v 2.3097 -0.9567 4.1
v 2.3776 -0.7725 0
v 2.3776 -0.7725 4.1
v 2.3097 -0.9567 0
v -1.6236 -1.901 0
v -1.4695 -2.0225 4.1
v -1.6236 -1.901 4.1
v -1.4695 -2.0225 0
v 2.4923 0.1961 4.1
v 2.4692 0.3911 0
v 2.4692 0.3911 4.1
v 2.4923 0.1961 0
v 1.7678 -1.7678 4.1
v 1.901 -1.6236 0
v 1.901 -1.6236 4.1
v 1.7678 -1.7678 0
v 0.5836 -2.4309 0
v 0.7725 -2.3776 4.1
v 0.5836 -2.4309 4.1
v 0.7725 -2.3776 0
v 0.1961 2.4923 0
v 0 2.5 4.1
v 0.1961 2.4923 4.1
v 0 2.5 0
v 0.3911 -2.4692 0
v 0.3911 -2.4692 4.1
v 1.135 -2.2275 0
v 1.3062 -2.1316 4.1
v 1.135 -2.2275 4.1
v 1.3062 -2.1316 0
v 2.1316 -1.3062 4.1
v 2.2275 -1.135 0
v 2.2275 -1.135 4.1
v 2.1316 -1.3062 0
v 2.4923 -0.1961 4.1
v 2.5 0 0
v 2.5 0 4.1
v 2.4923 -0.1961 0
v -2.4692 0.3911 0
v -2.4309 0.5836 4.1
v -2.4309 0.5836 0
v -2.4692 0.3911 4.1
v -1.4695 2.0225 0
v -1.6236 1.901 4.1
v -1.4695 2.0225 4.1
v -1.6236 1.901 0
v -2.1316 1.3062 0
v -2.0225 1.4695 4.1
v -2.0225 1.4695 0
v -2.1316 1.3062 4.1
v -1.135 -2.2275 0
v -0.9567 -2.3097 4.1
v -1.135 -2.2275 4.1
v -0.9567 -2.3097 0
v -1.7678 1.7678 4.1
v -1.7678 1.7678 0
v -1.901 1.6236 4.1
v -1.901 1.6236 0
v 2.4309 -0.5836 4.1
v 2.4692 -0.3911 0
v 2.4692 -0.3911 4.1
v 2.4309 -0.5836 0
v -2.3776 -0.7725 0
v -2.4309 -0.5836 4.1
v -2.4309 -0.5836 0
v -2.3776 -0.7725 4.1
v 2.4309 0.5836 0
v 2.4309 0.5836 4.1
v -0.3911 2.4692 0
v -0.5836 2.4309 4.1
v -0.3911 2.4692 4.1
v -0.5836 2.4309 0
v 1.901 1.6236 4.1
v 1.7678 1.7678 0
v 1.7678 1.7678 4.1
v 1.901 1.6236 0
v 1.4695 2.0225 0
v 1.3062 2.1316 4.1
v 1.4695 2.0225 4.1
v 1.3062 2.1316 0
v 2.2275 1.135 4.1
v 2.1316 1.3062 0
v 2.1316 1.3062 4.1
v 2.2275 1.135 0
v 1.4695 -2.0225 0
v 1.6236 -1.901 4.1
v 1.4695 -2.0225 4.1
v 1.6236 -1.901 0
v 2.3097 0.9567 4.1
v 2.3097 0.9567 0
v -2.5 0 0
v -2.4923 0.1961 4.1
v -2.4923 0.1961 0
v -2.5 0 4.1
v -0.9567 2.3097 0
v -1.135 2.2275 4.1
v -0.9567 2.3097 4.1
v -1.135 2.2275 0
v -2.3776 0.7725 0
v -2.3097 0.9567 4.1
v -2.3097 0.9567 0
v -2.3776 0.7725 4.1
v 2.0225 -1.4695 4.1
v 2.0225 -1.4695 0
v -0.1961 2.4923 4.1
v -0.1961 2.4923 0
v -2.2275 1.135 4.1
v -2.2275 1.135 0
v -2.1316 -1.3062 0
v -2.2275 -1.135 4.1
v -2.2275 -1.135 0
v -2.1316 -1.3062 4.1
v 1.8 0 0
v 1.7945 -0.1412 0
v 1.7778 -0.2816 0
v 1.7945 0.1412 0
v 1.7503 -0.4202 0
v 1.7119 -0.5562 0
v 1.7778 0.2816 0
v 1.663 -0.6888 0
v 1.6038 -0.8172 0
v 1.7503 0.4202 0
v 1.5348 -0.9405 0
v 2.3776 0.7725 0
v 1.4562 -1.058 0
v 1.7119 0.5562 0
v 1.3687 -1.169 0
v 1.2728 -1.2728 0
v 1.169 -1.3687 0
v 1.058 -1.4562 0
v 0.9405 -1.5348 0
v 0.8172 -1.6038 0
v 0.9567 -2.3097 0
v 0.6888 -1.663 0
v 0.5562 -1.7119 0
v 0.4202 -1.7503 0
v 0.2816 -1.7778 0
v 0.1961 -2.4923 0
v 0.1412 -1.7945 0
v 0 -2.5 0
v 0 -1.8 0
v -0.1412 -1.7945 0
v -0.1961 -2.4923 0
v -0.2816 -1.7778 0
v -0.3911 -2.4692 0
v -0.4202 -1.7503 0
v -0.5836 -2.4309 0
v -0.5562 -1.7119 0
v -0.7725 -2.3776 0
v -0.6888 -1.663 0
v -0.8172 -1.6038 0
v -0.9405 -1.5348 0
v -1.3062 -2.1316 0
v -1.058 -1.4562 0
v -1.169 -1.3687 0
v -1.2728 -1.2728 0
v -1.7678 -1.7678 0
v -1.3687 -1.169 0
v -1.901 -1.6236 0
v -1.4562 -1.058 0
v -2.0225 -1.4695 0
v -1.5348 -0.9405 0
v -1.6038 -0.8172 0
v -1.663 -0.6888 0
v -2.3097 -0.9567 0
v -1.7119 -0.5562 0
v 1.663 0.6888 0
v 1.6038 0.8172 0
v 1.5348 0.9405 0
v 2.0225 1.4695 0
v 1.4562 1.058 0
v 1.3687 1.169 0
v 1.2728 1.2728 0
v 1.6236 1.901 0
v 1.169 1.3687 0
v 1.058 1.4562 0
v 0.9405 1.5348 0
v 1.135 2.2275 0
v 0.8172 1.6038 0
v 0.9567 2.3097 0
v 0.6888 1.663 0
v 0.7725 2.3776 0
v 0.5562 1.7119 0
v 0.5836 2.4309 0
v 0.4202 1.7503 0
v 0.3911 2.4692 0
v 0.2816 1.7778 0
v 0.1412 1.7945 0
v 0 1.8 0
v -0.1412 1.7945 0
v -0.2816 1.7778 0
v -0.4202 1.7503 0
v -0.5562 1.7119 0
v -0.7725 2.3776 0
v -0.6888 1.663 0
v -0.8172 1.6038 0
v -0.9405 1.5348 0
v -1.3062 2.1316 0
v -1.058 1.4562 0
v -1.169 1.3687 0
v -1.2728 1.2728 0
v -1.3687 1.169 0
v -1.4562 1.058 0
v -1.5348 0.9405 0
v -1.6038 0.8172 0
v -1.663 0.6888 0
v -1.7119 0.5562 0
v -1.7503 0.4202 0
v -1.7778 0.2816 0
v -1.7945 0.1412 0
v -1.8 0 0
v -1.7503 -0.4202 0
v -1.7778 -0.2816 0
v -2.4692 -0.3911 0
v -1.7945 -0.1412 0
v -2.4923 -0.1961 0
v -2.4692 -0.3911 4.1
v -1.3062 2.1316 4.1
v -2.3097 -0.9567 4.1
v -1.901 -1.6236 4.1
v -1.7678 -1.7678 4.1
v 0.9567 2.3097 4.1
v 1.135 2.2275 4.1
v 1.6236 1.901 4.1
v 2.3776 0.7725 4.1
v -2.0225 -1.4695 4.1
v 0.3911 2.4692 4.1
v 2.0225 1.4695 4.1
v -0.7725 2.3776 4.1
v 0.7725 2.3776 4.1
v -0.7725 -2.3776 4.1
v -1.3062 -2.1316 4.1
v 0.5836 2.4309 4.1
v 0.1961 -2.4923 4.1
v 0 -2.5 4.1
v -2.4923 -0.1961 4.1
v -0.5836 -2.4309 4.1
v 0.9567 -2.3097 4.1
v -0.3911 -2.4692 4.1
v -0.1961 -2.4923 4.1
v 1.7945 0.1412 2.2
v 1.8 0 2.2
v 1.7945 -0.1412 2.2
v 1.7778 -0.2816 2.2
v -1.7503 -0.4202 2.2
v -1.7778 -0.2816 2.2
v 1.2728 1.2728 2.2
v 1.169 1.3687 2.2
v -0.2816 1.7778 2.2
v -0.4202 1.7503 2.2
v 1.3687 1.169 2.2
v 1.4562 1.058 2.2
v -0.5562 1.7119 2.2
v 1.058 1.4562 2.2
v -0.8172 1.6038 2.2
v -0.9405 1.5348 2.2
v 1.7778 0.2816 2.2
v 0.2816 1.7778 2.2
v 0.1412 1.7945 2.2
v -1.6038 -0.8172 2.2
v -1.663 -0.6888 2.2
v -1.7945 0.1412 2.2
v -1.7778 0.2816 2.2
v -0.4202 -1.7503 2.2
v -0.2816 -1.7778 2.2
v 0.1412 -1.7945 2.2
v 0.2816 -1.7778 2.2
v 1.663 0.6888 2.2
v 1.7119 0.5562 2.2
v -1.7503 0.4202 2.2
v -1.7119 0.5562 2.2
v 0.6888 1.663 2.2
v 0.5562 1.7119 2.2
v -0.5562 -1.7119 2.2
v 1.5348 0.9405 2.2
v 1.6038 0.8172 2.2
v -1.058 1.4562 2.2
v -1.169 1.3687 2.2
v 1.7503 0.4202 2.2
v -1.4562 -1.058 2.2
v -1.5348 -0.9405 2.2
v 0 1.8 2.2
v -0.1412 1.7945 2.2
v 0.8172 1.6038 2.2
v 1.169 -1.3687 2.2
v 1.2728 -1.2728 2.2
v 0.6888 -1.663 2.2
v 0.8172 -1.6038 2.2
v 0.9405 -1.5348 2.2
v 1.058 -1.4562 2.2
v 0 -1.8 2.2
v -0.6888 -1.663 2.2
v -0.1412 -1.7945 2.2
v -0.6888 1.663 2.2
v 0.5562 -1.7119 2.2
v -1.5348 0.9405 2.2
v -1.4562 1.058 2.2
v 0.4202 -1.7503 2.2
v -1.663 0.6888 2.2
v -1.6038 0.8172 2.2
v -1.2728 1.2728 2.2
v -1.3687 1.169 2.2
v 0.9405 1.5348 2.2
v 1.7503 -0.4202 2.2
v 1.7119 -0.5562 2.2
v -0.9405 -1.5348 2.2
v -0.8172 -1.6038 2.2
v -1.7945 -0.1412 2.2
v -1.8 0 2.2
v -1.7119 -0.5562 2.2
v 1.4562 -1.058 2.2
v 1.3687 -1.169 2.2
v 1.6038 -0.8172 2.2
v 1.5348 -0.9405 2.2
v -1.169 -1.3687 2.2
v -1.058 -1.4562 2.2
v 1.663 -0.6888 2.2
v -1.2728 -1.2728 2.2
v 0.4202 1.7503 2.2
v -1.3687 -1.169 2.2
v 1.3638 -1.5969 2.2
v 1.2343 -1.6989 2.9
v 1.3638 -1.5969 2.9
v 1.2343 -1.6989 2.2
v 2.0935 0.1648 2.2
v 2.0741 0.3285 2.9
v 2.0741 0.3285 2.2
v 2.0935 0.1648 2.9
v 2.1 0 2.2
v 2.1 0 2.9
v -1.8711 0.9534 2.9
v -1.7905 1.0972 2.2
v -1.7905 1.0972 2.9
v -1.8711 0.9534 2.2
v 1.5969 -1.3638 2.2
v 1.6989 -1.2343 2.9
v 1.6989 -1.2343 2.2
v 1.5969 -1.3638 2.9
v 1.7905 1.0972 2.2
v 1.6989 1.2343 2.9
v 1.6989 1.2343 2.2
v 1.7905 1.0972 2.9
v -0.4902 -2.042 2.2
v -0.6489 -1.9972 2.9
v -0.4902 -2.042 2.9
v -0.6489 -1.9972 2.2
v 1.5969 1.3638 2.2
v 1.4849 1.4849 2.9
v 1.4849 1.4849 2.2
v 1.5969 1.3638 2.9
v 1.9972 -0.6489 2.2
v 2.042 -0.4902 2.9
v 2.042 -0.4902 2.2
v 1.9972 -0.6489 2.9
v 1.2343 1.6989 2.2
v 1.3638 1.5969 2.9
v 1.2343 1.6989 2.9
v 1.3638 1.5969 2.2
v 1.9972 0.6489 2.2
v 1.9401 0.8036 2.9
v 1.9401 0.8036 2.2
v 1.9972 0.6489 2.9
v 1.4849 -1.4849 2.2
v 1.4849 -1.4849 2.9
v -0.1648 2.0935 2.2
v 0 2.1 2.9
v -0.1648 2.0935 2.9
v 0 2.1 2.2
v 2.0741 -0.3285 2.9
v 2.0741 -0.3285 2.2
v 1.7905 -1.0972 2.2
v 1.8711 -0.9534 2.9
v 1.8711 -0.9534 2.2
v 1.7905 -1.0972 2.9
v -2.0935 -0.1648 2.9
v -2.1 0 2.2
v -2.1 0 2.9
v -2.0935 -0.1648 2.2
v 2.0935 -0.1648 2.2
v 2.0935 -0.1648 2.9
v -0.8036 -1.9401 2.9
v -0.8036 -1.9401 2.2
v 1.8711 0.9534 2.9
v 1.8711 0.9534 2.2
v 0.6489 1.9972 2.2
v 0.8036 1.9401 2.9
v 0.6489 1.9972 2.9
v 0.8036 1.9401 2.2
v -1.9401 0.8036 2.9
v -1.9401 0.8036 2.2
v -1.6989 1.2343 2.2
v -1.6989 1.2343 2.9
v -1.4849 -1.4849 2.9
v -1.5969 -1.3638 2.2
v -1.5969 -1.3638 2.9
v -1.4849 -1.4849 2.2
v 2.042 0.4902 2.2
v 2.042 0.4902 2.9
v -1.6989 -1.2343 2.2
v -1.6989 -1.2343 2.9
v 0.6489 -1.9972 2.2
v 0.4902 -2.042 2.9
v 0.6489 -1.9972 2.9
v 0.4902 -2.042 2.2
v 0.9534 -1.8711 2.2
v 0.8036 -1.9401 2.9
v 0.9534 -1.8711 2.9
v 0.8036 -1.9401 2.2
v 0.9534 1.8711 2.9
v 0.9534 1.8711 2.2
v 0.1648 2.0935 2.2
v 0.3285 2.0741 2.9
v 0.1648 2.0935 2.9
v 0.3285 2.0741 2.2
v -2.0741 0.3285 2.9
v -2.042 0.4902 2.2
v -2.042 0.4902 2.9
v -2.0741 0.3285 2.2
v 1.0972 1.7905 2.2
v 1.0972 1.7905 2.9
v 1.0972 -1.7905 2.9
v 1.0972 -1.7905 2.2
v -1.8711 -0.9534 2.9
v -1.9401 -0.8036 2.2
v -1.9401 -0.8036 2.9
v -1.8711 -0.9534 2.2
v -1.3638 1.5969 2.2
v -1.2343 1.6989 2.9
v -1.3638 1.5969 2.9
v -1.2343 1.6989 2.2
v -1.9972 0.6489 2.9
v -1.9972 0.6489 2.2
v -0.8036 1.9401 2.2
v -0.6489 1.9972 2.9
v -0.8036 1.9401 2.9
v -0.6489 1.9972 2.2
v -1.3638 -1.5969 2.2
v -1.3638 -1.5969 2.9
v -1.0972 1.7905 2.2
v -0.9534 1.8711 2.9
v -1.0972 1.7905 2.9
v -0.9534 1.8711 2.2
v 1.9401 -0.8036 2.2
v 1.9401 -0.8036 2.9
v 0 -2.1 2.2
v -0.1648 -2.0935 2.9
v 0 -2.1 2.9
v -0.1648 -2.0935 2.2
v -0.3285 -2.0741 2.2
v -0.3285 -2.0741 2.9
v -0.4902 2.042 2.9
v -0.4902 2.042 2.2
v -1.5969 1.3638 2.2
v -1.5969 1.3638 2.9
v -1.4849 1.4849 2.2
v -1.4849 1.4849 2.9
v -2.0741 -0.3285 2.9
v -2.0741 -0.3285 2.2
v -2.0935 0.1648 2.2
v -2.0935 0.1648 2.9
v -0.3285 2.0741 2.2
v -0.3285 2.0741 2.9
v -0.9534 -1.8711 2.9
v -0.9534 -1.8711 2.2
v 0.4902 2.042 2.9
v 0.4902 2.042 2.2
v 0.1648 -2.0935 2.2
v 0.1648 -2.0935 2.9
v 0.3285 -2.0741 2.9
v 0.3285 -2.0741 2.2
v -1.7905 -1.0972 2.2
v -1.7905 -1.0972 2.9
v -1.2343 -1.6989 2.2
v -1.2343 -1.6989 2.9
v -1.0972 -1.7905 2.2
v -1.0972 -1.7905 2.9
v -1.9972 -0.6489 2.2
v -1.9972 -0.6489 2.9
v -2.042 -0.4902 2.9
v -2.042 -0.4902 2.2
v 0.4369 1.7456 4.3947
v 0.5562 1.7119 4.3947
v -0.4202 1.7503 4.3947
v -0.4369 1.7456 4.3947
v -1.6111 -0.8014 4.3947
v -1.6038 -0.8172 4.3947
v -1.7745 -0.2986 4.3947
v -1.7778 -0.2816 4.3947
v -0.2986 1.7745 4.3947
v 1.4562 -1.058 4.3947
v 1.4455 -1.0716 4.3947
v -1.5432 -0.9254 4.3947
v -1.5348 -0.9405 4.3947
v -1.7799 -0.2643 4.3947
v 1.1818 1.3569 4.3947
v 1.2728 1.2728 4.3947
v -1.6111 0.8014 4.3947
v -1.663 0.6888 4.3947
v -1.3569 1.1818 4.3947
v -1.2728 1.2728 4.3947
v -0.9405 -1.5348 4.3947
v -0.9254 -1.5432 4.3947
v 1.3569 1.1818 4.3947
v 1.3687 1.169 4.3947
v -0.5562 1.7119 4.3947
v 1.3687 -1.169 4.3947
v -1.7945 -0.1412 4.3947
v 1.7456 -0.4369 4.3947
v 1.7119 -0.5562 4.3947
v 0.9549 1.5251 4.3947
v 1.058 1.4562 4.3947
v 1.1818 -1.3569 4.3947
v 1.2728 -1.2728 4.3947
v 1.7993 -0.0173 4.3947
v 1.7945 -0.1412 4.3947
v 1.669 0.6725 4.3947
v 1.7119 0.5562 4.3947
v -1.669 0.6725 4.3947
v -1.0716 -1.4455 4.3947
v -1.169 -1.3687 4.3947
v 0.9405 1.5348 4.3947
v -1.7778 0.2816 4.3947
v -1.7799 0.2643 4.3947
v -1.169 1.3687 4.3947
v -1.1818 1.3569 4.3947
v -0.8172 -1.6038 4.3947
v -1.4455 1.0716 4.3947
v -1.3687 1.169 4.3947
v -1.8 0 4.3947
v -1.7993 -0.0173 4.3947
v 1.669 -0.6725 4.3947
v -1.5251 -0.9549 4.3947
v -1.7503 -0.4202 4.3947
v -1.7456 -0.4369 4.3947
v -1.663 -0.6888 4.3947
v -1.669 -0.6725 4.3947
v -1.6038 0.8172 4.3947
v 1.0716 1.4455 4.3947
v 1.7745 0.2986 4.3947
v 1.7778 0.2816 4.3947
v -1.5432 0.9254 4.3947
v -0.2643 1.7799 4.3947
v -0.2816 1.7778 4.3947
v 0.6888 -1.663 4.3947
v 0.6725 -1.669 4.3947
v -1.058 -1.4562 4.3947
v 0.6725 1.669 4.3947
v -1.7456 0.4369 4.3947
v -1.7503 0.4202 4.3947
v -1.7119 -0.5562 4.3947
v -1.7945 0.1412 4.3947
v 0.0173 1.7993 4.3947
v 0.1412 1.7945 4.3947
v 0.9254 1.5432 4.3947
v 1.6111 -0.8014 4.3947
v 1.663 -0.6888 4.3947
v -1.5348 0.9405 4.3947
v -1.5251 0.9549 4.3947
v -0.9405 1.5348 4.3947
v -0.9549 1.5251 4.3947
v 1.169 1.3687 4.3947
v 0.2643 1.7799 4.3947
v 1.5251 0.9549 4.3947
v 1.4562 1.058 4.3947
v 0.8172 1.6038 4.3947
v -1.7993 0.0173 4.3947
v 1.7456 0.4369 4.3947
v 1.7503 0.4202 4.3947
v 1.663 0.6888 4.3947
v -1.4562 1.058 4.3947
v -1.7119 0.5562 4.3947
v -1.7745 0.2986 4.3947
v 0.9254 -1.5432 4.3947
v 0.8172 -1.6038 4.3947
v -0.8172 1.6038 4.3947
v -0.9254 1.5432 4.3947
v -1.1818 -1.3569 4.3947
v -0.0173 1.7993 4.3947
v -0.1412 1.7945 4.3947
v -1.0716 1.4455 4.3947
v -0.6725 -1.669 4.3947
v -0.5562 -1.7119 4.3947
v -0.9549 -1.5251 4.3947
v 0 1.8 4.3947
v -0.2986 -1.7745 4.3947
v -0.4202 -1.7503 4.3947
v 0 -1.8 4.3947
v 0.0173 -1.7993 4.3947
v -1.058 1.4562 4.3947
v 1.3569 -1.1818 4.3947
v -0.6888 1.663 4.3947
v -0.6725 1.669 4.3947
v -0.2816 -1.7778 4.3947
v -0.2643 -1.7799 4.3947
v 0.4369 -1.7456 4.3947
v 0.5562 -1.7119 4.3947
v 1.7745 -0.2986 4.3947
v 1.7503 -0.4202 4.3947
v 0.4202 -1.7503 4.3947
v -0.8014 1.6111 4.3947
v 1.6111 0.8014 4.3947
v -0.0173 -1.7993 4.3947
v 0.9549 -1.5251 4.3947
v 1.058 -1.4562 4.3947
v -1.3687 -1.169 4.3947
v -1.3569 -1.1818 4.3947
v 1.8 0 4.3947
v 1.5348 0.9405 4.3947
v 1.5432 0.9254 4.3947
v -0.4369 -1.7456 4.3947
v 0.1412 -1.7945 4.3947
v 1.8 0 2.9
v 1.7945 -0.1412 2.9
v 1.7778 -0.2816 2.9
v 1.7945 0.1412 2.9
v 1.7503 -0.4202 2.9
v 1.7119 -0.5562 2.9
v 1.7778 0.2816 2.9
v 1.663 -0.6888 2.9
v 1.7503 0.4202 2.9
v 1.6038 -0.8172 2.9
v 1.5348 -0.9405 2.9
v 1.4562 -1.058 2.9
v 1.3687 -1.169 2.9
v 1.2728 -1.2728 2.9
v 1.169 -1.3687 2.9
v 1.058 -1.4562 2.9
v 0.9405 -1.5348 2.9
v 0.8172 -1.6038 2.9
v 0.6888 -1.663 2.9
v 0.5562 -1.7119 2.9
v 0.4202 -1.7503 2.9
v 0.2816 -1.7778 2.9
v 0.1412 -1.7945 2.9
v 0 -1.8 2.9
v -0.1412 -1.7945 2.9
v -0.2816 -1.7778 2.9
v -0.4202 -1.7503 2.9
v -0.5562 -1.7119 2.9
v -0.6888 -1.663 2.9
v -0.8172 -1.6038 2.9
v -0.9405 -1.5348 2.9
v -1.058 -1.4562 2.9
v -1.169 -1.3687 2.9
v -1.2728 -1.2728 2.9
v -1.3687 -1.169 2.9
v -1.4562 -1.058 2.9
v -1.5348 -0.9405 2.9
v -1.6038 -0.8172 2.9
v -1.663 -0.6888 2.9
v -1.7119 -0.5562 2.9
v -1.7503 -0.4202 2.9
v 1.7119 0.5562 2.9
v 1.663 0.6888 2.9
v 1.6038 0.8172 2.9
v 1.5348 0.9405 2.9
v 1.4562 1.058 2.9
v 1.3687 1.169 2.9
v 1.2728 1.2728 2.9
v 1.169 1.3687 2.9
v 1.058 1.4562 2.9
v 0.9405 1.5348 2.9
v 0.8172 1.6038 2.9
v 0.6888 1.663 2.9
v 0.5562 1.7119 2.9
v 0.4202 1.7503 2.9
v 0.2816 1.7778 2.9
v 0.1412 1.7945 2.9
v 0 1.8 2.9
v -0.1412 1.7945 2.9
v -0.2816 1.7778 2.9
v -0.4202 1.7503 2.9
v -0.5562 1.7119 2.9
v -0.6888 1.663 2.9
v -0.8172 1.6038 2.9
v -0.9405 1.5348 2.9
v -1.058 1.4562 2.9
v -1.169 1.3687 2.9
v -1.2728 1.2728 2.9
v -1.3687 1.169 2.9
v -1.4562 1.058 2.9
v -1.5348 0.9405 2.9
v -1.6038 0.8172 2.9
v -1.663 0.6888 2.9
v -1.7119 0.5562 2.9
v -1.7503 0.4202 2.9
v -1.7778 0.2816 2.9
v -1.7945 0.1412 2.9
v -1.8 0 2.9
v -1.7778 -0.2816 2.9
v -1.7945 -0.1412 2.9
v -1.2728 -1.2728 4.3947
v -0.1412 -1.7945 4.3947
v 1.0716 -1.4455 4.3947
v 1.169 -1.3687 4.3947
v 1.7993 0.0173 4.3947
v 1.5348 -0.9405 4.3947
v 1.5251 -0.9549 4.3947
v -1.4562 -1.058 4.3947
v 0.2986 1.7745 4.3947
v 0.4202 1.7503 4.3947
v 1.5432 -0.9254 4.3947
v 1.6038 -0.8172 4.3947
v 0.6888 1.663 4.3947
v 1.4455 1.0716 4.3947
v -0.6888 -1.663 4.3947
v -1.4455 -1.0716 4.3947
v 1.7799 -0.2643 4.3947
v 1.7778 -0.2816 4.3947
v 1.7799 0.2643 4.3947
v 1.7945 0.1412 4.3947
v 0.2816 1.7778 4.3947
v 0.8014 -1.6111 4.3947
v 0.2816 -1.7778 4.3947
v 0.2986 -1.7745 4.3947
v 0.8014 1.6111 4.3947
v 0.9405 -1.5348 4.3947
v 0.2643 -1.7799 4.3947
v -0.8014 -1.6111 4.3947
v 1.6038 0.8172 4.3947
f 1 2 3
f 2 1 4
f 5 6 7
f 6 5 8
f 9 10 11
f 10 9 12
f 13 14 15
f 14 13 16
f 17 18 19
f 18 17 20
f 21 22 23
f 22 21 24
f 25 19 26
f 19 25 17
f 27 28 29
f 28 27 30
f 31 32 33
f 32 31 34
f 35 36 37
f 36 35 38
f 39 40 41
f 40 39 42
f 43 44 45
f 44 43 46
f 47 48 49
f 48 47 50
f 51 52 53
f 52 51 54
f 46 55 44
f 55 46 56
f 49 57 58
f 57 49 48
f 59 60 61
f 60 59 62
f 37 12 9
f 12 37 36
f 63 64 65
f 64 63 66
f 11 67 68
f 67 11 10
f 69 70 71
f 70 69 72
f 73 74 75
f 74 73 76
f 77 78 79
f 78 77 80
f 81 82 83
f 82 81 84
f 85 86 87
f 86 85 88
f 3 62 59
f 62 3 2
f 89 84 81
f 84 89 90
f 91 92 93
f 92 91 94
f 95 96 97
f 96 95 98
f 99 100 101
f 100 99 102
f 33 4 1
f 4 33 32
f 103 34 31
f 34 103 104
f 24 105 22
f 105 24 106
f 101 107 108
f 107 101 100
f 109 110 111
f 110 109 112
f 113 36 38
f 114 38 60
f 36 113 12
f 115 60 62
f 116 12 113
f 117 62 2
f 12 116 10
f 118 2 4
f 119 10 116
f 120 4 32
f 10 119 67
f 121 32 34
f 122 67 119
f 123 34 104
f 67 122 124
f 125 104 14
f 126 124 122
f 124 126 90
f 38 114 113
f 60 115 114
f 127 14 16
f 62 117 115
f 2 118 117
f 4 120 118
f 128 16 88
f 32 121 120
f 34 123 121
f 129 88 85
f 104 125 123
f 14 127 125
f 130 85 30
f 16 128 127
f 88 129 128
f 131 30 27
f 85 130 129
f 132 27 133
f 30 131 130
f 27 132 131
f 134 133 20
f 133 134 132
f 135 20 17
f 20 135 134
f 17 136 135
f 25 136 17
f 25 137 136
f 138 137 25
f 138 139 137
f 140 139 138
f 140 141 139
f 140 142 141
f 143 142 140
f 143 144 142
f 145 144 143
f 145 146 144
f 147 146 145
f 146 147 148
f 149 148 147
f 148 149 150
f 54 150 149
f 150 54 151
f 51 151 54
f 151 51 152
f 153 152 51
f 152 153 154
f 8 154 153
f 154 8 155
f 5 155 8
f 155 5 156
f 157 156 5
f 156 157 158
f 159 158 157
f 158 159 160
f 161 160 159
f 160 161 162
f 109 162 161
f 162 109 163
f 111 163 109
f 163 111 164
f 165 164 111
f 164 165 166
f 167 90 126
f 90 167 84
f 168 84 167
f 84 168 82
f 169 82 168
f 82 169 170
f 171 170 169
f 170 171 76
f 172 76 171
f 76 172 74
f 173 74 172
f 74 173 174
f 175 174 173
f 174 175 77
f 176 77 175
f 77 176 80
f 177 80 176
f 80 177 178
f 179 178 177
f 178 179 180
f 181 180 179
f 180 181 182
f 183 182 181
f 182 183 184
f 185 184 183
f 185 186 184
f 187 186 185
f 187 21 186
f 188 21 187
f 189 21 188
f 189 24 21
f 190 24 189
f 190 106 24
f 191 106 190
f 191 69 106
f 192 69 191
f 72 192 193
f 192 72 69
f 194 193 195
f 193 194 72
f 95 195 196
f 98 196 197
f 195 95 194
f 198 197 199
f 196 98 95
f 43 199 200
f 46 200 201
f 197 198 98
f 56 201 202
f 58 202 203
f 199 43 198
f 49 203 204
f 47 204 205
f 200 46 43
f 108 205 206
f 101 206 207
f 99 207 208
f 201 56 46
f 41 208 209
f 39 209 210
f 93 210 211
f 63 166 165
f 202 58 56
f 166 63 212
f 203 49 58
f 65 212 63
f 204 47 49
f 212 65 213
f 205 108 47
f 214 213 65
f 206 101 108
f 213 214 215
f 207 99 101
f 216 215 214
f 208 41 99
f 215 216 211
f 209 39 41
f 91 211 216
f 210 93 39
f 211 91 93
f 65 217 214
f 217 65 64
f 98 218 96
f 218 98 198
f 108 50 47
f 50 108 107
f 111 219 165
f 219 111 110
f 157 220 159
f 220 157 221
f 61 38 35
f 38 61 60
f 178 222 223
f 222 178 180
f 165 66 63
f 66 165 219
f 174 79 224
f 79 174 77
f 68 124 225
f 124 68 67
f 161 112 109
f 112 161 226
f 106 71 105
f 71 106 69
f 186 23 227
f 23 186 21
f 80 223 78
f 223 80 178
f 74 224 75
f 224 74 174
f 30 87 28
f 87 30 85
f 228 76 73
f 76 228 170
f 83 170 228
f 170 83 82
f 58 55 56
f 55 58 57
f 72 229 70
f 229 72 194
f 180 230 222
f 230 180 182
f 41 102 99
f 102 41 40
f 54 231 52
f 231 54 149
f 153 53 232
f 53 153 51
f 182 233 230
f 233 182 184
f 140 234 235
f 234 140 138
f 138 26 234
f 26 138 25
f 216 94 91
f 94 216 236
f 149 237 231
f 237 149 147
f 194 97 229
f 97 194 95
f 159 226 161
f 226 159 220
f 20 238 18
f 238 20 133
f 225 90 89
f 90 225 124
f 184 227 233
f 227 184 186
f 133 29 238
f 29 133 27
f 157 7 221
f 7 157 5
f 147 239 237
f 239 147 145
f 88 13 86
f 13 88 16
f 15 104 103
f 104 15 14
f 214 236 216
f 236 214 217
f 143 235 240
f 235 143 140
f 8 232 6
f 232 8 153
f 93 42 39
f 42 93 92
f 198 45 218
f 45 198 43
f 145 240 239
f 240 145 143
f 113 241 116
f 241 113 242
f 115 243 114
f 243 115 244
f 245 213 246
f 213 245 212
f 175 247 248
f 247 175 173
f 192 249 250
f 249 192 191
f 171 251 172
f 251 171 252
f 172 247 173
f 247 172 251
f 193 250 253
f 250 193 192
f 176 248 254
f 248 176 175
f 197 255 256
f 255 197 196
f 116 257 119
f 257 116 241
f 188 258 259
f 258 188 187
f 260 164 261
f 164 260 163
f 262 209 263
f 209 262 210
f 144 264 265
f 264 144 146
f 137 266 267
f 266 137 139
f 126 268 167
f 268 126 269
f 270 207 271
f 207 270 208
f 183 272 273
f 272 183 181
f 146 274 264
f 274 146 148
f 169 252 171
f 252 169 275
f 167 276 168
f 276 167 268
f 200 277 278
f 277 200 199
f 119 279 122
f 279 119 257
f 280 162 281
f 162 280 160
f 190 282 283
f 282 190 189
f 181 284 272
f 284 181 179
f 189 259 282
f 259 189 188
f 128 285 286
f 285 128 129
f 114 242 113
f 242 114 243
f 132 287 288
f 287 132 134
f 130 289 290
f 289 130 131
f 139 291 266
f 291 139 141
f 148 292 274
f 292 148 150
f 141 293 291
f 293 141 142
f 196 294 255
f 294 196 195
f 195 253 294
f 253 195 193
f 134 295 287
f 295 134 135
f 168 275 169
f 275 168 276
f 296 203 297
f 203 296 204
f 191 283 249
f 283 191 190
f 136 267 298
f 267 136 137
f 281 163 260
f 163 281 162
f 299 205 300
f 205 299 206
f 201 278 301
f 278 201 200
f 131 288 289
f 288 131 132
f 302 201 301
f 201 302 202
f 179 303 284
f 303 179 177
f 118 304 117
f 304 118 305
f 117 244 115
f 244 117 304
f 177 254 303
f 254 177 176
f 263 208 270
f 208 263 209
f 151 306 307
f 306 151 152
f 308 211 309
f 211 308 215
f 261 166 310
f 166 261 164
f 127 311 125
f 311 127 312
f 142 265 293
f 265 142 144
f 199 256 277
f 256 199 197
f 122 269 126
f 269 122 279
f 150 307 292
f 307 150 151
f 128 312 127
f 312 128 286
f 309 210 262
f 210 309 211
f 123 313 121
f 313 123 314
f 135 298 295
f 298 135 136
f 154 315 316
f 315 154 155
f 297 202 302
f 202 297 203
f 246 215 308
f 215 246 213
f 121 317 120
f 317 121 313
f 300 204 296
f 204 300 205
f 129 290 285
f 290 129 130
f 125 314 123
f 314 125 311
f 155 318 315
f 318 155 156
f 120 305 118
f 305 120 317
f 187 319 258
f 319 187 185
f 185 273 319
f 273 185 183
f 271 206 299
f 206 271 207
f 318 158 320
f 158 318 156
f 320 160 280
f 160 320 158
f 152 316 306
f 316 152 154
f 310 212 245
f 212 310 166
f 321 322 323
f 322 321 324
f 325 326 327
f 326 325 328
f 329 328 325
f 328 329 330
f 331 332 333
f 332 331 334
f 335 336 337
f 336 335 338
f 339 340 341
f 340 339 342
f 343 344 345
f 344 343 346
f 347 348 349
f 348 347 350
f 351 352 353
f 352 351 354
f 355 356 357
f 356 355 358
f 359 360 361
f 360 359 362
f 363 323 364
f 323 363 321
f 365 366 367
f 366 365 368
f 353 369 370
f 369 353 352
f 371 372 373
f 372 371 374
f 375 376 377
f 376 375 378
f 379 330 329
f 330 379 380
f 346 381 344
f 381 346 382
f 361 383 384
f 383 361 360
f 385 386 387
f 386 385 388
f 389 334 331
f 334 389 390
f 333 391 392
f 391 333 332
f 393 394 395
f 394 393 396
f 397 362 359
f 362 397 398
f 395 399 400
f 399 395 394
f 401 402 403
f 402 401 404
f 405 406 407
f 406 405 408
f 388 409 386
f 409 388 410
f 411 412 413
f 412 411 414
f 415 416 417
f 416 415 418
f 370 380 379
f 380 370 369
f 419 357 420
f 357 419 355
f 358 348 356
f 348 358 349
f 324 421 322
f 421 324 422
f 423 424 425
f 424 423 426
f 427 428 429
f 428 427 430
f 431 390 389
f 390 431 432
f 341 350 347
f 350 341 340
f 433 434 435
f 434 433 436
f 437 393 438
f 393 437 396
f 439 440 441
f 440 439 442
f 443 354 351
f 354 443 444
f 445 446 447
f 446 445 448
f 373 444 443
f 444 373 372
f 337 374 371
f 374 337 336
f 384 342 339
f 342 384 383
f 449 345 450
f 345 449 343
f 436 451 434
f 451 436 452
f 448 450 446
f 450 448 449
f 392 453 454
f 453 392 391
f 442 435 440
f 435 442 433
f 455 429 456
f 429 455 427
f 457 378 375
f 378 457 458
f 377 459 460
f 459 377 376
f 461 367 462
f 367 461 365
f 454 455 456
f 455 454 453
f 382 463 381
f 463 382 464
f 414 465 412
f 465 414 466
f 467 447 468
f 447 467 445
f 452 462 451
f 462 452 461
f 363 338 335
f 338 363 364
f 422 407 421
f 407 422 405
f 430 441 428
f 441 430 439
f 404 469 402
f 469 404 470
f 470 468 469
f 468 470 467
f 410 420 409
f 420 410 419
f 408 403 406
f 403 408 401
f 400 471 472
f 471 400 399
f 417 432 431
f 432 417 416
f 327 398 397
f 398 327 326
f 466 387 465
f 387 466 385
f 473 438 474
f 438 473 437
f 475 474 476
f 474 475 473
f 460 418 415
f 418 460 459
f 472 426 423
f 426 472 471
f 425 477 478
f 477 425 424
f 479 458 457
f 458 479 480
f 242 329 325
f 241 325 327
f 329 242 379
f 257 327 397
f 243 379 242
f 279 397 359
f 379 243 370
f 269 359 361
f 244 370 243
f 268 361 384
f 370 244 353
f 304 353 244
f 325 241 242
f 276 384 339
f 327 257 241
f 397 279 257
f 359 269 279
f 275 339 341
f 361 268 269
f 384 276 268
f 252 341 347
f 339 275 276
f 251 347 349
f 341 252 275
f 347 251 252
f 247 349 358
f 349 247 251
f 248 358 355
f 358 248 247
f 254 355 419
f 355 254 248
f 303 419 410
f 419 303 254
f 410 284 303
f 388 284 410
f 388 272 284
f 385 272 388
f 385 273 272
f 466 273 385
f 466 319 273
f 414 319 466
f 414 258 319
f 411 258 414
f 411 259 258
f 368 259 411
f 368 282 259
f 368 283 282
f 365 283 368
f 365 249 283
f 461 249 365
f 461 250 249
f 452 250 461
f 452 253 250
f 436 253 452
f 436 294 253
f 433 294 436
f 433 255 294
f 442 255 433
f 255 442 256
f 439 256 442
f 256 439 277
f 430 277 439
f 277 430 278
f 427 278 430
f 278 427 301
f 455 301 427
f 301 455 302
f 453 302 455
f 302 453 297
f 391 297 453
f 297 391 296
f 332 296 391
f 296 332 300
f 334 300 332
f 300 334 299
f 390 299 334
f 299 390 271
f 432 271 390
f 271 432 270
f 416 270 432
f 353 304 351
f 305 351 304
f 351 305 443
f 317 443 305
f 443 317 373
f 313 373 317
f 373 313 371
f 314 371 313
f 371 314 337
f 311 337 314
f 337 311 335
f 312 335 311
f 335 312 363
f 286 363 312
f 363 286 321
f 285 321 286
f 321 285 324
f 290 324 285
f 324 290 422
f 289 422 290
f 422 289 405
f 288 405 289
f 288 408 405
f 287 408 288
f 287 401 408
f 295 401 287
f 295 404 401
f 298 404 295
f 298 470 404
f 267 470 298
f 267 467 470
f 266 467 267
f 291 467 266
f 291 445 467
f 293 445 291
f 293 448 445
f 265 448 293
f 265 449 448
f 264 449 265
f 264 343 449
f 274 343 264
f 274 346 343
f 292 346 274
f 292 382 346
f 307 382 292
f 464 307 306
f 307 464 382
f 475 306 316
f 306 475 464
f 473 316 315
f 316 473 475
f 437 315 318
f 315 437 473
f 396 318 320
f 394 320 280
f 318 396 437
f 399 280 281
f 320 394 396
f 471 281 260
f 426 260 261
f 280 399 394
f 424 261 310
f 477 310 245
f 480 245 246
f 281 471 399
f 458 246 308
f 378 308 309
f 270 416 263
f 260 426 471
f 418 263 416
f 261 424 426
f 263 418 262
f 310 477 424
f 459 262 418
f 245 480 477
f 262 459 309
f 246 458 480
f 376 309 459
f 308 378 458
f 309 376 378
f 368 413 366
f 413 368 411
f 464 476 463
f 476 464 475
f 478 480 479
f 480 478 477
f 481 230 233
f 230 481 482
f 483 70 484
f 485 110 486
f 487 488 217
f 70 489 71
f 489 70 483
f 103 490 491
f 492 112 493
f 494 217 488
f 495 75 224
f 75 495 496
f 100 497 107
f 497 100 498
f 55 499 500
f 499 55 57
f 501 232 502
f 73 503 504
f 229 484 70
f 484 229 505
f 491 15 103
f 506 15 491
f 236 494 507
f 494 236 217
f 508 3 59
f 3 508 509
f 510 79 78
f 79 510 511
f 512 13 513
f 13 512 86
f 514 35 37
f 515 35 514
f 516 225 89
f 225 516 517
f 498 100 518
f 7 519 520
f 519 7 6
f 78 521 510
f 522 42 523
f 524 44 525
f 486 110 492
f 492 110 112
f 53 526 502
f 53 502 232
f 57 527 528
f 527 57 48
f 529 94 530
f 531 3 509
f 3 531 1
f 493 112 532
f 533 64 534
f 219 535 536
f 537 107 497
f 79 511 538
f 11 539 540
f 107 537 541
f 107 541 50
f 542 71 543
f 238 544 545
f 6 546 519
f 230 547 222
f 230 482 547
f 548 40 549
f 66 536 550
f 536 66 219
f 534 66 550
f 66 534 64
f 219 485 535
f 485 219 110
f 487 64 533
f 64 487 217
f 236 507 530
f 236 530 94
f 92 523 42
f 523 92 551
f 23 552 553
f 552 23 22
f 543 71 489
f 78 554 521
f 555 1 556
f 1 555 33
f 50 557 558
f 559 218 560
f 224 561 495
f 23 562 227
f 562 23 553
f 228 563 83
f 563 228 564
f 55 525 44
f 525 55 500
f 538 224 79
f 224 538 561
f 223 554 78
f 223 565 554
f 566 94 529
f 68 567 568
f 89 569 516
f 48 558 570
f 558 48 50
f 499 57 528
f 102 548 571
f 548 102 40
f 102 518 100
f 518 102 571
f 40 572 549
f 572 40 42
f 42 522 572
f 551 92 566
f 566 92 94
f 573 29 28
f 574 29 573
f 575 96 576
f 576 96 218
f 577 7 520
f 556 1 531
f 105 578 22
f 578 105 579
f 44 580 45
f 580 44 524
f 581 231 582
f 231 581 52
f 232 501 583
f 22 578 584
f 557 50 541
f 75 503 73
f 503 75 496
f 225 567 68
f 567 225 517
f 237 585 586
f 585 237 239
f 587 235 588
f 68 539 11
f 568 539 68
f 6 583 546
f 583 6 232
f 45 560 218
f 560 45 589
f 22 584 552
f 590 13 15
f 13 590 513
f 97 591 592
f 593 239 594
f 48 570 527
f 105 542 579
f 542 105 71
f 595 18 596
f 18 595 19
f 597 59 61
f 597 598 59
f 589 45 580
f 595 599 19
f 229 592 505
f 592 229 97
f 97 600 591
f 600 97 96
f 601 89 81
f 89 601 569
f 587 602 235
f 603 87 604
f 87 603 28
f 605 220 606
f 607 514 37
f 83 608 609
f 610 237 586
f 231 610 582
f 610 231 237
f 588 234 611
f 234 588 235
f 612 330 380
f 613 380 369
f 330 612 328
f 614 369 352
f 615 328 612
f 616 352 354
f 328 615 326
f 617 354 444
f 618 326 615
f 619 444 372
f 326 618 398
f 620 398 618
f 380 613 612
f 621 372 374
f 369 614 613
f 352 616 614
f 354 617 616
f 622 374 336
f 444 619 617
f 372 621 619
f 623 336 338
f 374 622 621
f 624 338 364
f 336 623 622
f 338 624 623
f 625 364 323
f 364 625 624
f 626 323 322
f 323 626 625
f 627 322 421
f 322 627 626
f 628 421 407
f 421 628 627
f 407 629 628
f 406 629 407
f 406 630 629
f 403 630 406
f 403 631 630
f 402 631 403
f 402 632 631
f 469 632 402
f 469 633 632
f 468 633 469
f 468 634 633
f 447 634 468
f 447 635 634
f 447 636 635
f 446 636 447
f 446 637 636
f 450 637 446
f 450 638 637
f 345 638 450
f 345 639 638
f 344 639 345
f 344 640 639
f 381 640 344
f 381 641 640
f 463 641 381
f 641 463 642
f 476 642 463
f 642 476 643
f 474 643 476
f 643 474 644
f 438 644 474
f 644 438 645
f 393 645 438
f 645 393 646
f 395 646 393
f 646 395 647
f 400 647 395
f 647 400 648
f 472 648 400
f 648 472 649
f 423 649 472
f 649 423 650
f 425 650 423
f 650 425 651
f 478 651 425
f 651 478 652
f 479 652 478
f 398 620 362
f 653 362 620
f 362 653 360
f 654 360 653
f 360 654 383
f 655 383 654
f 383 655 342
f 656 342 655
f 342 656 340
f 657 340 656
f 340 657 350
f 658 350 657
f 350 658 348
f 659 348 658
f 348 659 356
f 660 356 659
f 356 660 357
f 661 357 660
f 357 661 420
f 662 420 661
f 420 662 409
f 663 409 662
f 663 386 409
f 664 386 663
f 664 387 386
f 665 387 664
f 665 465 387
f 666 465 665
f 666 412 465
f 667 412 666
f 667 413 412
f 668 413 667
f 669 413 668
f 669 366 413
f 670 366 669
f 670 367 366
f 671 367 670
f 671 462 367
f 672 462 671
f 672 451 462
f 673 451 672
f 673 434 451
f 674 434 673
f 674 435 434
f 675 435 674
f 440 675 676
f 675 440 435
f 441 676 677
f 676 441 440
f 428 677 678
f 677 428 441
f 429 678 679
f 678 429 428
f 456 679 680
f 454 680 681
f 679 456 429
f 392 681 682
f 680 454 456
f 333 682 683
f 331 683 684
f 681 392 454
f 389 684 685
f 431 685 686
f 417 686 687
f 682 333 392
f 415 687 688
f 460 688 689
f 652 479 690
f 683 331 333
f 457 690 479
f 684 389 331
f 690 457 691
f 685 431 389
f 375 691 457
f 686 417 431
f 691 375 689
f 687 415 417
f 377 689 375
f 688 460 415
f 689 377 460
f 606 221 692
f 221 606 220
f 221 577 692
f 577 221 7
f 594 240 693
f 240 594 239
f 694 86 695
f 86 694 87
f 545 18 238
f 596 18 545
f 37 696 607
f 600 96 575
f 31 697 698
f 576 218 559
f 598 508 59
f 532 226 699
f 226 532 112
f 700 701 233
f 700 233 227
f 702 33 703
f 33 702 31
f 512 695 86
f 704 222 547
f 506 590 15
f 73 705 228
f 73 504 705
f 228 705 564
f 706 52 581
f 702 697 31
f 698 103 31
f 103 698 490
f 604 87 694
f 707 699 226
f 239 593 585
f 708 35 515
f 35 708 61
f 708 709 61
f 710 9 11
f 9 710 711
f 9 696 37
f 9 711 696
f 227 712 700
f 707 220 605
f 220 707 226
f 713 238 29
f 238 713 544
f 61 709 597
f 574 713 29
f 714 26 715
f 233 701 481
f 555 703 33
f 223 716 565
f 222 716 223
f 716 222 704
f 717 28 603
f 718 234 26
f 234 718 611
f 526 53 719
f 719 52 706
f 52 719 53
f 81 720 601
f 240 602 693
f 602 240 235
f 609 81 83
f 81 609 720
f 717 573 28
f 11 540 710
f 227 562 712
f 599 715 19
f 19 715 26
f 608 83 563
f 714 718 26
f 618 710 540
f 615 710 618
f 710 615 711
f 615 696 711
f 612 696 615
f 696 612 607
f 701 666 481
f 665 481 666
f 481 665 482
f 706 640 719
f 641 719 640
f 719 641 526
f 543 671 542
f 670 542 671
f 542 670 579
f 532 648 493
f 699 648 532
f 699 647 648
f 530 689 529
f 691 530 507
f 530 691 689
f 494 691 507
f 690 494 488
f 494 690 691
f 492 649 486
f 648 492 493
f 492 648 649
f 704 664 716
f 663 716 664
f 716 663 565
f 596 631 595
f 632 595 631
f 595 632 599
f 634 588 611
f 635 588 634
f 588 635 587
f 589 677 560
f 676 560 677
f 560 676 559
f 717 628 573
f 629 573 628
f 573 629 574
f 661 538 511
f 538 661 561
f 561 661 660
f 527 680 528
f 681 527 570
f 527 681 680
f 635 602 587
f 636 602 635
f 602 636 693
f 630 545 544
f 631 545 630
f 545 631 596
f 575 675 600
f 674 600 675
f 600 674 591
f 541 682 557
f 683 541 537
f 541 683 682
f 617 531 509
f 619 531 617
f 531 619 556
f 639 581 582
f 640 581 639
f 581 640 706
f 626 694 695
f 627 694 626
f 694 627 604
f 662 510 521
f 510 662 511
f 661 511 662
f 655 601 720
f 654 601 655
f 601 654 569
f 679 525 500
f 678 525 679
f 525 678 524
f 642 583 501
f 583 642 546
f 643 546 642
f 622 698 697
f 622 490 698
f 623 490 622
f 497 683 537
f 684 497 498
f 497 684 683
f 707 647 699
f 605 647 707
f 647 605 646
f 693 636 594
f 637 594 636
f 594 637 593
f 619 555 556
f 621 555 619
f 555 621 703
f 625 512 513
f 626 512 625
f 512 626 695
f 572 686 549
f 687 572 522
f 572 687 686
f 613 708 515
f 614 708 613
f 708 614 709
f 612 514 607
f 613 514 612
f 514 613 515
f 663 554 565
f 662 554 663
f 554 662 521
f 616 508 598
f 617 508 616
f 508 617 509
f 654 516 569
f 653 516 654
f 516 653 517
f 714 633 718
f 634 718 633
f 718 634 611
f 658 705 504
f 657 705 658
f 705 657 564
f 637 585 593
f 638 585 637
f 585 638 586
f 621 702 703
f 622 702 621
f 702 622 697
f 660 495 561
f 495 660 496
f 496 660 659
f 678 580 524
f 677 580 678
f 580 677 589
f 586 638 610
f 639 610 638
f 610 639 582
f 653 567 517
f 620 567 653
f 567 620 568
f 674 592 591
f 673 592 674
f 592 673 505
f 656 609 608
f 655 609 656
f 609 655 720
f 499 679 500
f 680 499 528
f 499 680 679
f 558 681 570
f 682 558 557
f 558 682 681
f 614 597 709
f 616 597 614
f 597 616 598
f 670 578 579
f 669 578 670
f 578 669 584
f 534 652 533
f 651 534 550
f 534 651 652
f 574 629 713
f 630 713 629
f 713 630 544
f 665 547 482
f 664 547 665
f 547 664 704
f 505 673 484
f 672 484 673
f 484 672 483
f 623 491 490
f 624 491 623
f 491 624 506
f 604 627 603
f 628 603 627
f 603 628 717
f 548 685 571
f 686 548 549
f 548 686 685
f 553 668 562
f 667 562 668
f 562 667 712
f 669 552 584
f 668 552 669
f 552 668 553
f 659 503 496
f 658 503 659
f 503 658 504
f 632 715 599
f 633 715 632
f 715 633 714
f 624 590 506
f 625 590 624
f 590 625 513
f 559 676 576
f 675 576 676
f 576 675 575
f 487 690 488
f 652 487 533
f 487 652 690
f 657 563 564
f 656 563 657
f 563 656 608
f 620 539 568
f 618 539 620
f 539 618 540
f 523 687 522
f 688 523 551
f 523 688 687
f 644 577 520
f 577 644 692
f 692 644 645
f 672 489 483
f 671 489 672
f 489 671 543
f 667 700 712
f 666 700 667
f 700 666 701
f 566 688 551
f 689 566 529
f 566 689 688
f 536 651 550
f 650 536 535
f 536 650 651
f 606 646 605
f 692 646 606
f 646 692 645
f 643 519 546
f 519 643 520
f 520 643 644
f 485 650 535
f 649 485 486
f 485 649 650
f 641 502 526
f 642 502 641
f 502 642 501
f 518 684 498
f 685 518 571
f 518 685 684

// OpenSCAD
// Design A: Frangible Ogive Capsule
// 5mm diameter x 5mm length
// Optimized for compressed air ejection + impact-only payload release (powder or liquid)
// Frangible nose breaks on impact, payload forced forward.

$fn = 80; // High resolution for 3D print

// Parameters (tune for your printer)
outer_dia = 5.0;
total_length = 5.0;
nose_length = 2.0;          // Ogive part
body_length = total_length - nose_length;

wall_thickness = 0.45;      // Main wall
frangible_wall = 0.32;      // Thin nose wall - breaks on impact
chamber_dia = 3.6;
chamber_length = 2.8;

// Ogive nose (secant ogive approximation for low drag)
module ogive_nose() {
    // Approximate ogive
    difference() {
        // Main nose shape
        hull() {
            cylinder(h = nose_length * 0.6, d = outer_dia, center = false);
            translate([0, 0, nose_length * 0.95])
                cylinder(h = 0.1, d = 1.2, center = false);  // Sharp tip
        }
        
        // Frangible front chamber cutout (thin walls)
        translate([0, 0, -0.01])
            cylinder(h = nose_length + 0.5, d = chamber_dia, center = false);
    }
}

// Main body with internal chamber
module body() {
    difference() {
        // Outer cylinder
        cylinder(h = body_length, d = outer_dia);
        
        // Internal payload chamber (open to nose)
        translate([0, 0, -0.01])
            cylinder(h = chamber_length + 0.5, d = chamber_dia);
        
        // Thin frangible section at front of body (transition to nose)
        translate([0, 0, body_length - 0.8])
            cylinder(h = 1.0, d = chamber_dia + 0.6);
    }
}

// Rear seal (press-fit or glue after filling)
module rear_seal() {
    translate([0, 0, -0.8])
        cylinder(h = 1.0, d = outer_dia - 0.15);  // Slight interference fit
}

// Full assembly
module frangible_capsule() {
    union() {
        // Body
        body();
        
        // Frangible ogive nose (will be printed attached or separate)
        translate([0, 0, body_length - 0.1])
            ogive_nose();
        
        // Optional: thin break-line grooves on nose for controlled fracture
        // (uncomment for more frangible behavior)
        // for (i = [0 : 3]) {
        //     rotate([0, 0, i * 90])
        //         translate([1.6, 0, body_length + 0.3])
        //             cube([0.15, 0.8, 1.2], center = true);
        // }
    }
}

// Render the prototype
frangible_capsule();

// To print:
// 1. Render and export STL
// 2. Print nose-up for best frangible detail
// 3. Fill chamber with powder/liquid, press in rear_seal and glue if needed
// 4. Test: Should survive barrel acceleration but release on hard impact

echo("Design A: Frangible Ogive Capsule - 5x5mm");
echo("Total volume approx:", PI * (outer_dia/2)^2 * total_length, "mm3");
echo("Recommended: Print with 0.1mm layers, PLA for brittleness");
